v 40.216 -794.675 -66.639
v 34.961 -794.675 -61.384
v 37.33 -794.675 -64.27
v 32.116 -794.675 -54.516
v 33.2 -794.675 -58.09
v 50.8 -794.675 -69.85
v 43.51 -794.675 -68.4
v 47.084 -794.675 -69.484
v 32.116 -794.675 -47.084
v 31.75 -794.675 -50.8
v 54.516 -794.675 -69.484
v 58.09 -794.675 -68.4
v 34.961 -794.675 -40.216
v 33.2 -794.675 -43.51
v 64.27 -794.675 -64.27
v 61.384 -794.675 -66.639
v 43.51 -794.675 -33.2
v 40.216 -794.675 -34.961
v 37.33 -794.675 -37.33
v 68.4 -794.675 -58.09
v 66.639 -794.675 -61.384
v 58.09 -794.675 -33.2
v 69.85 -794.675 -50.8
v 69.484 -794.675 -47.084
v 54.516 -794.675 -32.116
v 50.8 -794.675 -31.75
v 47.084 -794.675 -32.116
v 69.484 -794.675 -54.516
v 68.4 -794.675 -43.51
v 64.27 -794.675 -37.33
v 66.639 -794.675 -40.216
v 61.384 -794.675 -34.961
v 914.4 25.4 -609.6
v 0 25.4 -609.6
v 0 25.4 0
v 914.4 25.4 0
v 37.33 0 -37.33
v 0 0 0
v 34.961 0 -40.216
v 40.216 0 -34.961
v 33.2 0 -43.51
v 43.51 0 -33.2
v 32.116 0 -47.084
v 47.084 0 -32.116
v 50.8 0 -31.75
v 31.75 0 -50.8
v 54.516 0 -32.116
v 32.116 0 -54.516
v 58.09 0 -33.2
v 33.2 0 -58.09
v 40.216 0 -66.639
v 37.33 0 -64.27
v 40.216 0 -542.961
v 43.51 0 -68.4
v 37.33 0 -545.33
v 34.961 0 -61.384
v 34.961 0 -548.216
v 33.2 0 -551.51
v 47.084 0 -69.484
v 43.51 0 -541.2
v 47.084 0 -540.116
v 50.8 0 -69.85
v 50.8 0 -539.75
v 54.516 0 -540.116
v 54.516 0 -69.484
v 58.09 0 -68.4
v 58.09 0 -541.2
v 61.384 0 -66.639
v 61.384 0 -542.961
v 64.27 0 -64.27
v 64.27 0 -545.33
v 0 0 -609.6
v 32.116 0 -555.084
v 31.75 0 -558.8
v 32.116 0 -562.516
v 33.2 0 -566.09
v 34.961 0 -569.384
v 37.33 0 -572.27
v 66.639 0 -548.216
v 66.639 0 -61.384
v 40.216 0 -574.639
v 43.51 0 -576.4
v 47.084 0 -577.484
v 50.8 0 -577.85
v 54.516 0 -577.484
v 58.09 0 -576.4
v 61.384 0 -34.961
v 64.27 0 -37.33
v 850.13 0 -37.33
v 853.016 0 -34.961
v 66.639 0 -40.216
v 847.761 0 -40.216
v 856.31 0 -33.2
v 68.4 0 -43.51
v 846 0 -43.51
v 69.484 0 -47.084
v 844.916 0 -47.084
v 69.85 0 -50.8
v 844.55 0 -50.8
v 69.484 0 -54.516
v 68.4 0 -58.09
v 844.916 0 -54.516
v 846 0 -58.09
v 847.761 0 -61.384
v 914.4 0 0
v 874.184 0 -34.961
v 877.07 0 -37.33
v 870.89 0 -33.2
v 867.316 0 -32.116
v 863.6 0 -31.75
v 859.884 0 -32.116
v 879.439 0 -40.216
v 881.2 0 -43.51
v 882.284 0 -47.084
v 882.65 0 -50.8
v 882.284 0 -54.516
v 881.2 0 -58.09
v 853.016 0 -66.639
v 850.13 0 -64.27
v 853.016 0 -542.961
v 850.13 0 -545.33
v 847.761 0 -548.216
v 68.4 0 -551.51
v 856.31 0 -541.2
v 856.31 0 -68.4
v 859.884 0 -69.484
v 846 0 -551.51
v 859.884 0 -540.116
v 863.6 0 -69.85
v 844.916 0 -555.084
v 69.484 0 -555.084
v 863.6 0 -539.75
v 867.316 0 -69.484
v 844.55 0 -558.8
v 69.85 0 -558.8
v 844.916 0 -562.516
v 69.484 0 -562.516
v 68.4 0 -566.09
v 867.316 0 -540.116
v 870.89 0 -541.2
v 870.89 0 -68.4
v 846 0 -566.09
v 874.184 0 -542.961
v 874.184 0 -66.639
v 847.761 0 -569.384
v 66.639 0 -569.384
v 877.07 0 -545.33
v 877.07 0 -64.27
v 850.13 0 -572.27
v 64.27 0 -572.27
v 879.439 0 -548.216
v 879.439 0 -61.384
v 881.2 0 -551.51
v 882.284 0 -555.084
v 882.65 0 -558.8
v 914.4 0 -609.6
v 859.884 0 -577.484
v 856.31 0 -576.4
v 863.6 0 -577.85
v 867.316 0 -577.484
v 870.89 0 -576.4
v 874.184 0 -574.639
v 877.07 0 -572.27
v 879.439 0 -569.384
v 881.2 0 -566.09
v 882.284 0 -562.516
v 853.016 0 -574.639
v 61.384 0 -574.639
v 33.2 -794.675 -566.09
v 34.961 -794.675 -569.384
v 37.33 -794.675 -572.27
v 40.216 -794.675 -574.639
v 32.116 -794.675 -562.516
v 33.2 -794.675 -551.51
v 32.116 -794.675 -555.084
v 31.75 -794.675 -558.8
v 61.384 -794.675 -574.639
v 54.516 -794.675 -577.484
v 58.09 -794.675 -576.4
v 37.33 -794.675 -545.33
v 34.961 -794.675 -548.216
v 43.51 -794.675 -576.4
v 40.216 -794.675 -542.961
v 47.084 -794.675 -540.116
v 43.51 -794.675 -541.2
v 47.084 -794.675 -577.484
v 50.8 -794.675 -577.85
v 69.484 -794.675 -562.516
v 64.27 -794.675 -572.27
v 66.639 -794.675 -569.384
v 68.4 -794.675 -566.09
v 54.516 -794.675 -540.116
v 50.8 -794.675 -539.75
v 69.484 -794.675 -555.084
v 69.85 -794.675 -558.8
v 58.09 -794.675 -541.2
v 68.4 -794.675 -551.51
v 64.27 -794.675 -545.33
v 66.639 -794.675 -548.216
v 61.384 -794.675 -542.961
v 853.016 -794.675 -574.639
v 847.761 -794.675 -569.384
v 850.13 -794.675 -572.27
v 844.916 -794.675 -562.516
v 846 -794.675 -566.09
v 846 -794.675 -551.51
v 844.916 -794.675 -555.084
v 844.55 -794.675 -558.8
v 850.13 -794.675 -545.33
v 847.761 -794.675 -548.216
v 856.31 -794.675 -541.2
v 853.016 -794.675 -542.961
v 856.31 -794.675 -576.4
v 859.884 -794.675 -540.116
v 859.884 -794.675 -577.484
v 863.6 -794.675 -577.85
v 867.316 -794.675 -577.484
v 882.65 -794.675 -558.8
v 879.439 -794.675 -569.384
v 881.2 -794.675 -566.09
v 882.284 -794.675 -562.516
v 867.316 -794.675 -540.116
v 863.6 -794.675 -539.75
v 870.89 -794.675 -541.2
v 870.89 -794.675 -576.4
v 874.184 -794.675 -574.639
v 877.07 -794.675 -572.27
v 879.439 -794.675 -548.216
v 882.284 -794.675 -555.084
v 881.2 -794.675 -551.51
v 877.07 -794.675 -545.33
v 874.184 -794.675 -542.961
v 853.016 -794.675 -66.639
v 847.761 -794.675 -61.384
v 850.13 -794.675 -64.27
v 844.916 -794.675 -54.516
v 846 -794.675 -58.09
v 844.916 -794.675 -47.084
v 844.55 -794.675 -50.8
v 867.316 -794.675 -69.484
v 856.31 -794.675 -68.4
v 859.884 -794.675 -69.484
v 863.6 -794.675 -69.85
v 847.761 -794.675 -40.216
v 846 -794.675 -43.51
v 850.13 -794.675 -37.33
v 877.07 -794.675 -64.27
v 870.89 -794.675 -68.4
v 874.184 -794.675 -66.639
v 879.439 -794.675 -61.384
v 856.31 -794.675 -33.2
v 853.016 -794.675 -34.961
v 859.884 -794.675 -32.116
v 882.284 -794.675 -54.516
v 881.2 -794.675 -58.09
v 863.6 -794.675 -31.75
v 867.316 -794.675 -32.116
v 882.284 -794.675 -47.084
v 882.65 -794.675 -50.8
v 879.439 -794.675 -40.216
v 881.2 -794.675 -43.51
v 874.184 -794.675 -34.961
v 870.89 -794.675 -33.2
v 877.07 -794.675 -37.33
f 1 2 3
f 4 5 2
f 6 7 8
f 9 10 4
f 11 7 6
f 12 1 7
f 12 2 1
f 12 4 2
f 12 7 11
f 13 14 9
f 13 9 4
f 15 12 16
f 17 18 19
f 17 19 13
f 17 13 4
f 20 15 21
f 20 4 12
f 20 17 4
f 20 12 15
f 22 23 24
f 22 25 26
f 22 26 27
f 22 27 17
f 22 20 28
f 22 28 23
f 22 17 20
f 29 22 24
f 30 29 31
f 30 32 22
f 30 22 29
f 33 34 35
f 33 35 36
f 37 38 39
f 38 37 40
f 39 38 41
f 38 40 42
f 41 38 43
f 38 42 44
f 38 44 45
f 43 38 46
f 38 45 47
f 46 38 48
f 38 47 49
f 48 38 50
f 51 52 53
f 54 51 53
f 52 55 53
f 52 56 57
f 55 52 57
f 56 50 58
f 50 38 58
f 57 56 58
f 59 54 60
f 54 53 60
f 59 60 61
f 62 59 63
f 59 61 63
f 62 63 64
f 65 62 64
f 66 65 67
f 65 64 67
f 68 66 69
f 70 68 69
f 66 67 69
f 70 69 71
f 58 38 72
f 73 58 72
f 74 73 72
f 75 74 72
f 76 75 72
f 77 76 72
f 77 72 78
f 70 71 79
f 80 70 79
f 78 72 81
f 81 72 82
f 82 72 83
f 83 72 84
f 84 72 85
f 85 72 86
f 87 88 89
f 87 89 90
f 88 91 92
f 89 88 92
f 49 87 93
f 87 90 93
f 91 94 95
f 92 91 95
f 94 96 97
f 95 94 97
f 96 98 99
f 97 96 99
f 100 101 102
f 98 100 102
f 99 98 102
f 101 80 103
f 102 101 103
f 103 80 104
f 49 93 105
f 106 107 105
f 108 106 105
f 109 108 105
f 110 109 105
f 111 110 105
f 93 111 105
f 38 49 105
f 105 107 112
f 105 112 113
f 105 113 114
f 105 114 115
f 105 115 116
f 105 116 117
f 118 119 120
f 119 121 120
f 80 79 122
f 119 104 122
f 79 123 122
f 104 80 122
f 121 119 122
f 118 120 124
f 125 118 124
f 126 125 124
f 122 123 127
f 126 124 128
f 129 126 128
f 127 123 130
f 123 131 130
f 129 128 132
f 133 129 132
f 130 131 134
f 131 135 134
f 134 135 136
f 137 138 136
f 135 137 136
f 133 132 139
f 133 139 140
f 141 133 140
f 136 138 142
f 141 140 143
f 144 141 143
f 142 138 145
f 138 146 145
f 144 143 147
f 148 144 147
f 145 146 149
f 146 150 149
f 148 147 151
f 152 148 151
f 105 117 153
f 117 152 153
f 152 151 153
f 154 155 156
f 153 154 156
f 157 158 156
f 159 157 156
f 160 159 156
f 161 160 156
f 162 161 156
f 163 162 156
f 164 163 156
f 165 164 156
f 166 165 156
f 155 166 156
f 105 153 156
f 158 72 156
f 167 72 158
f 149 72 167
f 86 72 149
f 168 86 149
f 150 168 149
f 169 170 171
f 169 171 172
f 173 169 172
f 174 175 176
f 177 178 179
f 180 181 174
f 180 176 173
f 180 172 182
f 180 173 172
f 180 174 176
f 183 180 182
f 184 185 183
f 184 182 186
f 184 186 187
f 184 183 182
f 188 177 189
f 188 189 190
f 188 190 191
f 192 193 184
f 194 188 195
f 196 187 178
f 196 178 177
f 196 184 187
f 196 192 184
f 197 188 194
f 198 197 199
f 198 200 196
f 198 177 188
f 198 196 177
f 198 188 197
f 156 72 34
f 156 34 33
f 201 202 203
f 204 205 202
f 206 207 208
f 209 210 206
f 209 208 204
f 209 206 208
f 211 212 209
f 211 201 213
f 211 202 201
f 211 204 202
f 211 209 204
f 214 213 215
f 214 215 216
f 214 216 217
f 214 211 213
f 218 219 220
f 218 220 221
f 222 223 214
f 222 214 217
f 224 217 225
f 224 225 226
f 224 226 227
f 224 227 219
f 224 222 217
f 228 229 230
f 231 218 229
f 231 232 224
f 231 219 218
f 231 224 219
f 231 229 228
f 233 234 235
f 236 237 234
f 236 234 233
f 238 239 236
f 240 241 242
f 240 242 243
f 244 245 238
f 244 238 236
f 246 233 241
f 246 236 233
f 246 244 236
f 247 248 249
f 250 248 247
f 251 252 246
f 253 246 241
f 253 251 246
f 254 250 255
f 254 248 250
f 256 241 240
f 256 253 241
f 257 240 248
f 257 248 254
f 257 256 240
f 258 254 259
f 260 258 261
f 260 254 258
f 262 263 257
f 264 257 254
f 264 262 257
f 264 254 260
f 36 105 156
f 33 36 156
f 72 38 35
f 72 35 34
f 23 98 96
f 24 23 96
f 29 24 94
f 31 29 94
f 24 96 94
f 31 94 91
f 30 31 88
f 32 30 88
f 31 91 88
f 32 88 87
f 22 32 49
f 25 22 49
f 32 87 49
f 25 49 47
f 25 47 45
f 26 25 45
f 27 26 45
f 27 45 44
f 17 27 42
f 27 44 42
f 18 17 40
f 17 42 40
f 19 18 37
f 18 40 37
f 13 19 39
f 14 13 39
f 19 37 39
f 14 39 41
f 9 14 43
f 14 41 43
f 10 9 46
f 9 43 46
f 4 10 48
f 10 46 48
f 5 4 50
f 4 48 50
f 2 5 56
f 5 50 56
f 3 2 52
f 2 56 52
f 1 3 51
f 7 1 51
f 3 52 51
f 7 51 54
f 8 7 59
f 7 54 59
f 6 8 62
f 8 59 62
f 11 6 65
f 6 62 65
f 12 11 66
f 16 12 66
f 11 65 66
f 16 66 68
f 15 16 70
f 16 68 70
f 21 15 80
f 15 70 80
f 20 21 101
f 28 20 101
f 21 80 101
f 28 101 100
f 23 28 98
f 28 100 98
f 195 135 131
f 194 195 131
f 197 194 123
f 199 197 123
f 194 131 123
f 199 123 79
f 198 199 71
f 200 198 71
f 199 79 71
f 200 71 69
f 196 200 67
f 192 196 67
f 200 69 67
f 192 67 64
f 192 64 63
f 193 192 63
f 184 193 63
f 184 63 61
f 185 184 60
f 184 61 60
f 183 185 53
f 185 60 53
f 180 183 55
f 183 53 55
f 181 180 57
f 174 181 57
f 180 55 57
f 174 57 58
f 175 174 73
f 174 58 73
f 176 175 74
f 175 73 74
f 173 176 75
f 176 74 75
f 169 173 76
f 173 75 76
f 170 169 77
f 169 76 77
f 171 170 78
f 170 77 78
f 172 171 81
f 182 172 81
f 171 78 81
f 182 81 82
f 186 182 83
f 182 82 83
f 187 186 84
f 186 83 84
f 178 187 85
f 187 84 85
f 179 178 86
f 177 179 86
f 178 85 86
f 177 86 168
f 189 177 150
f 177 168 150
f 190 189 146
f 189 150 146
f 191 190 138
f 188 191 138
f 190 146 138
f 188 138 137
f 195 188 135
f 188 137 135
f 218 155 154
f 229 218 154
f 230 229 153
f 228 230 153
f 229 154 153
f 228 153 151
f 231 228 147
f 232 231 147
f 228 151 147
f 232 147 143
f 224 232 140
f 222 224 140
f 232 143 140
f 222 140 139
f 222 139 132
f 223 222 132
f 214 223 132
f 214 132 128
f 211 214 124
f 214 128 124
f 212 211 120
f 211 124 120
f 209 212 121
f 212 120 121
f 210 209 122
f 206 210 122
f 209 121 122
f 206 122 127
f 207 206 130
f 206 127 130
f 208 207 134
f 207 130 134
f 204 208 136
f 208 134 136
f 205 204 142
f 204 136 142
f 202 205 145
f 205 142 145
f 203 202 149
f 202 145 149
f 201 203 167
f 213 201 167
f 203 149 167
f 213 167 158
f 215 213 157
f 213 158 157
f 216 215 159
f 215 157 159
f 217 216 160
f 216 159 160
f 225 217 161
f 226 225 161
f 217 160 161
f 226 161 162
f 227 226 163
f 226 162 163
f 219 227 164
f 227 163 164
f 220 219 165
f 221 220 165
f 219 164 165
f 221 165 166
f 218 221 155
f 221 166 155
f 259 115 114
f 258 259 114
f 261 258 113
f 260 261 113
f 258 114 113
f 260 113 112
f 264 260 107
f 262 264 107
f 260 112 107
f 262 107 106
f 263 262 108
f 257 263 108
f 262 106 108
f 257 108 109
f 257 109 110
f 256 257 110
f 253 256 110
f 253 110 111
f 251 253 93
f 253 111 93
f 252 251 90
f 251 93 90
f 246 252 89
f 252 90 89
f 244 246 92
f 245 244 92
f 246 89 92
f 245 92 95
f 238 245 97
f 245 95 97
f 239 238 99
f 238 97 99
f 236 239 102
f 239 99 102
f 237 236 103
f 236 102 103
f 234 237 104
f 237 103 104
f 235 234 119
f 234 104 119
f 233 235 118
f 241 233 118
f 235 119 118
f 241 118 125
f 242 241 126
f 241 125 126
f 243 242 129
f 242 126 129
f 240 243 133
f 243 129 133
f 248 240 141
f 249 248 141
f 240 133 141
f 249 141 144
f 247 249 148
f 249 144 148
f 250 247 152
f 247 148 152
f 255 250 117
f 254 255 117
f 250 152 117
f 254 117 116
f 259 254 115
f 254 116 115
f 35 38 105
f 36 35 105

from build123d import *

# Parameters (mm, degrees)
SKETCH3_W   = 914.4
SKETCH3_H   = 609.6
TABLE_DEPTH = 25.4
SKETCH4_R   = 19.05
LEGS_DEPTH  = 794.675


with BuildPart() as part:
    # Sketch3 → Table (new body)
    with BuildSketch(Plane(origin=(0, 0, 0), x_dir=(1, 0, 0), z_dir=(0, 1, 0))):
        with Locations((457.2, 304.8)):
            Rectangle(SKETCH3_W, SKETCH3_H)
    extrude(amount=TABLE_DEPTH)

    # Sketch4 → Legs (add)
    with BuildSketch(Plane.XZ):
        with Locations((50.8, -50.8)):
            Circle(SKETCH4_R)
        with Locations((863.6, -50.8)):
            Circle(SKETCH4_R)
        with Locations((50.8, -558.8)):
            Circle(SKETCH4_R)
        with Locations((863.6, -558.8)):
            Circle(SKETCH4_R)
    extrude(amount=LEGS_DEPTH)


solid = part.part
